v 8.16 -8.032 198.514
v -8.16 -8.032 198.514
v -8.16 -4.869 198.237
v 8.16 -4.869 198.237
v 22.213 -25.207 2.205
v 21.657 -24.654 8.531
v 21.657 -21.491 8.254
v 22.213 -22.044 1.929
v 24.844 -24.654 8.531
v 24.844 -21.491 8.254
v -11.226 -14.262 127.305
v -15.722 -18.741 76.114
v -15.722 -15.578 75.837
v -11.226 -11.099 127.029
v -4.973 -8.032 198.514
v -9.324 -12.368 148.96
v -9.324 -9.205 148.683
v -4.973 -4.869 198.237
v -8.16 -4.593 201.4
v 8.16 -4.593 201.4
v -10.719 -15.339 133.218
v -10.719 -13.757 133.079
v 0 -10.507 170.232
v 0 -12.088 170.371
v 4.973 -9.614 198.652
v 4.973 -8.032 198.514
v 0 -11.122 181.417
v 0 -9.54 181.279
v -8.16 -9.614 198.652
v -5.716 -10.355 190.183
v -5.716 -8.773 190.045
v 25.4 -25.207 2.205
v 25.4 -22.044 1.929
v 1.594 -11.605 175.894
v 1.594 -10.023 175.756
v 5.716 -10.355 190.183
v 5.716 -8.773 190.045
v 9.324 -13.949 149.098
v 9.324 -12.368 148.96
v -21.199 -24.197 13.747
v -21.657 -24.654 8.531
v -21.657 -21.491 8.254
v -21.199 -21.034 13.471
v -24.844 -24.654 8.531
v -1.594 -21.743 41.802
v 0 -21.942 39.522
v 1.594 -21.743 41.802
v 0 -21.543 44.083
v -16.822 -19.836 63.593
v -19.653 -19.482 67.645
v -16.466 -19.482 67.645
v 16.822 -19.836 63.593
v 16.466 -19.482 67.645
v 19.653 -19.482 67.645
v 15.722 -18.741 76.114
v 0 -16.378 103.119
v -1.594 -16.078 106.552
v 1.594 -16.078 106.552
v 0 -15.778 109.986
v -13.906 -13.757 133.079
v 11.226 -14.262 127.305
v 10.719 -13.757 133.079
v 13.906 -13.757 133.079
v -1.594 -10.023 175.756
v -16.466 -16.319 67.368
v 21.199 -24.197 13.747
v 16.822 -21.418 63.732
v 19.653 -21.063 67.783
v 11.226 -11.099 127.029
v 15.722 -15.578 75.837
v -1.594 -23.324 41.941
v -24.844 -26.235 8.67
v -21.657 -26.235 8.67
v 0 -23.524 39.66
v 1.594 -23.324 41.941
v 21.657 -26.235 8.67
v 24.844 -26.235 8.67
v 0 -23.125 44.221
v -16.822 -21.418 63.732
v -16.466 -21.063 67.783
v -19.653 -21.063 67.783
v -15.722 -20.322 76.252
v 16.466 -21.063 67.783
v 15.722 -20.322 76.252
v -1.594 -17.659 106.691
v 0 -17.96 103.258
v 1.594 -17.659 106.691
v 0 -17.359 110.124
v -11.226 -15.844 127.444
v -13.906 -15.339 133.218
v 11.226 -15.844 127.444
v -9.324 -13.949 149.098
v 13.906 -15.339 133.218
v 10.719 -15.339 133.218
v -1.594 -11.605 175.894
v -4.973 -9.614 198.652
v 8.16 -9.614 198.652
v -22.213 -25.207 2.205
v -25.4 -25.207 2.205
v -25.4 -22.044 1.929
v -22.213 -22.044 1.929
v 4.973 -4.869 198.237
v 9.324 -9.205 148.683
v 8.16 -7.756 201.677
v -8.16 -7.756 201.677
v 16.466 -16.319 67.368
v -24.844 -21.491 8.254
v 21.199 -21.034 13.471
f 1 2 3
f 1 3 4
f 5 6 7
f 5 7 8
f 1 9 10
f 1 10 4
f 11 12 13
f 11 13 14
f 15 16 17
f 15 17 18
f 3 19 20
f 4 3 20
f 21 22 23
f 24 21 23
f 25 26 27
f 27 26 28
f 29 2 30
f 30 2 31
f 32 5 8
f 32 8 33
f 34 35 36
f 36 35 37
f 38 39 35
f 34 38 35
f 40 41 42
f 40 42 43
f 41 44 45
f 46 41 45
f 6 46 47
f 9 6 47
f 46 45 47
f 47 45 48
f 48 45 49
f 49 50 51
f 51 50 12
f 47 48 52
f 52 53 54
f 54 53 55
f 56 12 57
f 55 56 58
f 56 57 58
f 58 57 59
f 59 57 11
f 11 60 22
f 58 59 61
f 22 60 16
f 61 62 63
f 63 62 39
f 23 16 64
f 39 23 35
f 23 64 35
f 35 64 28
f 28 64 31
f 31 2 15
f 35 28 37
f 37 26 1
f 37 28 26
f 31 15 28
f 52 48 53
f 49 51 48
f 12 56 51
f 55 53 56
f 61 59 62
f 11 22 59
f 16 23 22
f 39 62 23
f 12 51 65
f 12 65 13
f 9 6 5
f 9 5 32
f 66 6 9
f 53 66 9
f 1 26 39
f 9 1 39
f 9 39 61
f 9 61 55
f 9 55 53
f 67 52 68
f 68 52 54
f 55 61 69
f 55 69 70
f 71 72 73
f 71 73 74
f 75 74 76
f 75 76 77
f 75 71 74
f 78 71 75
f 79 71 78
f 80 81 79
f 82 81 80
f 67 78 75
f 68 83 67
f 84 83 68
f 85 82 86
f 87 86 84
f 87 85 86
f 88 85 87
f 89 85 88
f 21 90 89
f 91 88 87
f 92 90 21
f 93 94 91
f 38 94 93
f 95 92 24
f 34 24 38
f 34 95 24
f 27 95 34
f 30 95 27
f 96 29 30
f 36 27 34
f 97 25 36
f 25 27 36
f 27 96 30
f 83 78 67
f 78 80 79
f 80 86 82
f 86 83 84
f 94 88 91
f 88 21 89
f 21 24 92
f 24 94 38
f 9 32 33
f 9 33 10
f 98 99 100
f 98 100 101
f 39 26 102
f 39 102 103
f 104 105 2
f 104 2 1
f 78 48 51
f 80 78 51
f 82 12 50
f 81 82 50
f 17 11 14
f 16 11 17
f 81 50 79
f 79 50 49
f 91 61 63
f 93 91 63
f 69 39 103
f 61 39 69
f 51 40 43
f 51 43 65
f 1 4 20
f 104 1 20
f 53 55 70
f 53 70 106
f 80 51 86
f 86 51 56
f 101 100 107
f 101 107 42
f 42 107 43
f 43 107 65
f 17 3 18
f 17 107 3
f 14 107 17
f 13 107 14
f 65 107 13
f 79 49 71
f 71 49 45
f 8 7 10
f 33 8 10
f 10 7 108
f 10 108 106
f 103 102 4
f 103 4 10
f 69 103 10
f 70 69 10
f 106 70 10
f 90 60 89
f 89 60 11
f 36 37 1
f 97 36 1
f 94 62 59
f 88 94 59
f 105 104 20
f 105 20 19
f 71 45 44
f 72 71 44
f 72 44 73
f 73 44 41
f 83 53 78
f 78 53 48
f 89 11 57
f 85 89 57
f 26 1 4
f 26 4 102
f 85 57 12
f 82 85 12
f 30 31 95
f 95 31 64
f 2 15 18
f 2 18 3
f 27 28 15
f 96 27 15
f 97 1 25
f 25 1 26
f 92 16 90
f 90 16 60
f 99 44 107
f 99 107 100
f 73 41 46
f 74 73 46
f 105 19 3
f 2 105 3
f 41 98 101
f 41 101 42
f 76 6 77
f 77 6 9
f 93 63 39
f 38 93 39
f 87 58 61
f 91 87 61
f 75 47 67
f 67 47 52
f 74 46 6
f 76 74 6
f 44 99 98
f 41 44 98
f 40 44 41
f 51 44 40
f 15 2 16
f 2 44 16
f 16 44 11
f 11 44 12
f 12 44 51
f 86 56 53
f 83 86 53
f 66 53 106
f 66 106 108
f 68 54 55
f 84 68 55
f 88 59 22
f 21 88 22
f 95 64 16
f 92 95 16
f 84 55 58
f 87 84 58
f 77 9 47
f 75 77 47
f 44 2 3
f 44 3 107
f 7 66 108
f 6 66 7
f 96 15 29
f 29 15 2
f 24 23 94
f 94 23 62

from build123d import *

# Parameters (mm, degrees)
F5_DEPTH = 3.175
F6_DEPTH = 3.175
F7_DEPTH = 1.5875


with BuildPart() as f5:
    # F4 (on line) → F5 (new body)
    with BuildSketch(Plane(origin=(0, -25.2070583861, 2.2053322939), x_dir=(1, 0, 0), z_dir=(0, -0.9961946966, 0.0871557602))):
        Polygon((-8.1596356954, 200.2332657202), (-8.1596356954, 197.0582657202), (-4.9725077112, 197.0582657202), (4.9725077112, 197.0582657202), (8.1596356954, 197.0582657202), (8.1596356954, 200.2332657202), align=None)
    extrude(amount=-F5_DEPTH)


with BuildPart() as f6:
    # F4 (on line) → F6 (new body)
    with BuildSketch(Plane(origin=(0, -25.2070583861, 2.2053322939), x_dir=(1, 0, 0), z_dir=(0, -0.9961946966, 0.0871557602))):
        Polygon((-4.9725077112, 197.0582657202), (-8.1596356954, 197.0582657202), (-5.7162625489, 188.5571090249), align=None)
        Polygon((-5.7162625489, 188.5571090249), (-8.1596356954, 197.0582657202), (-13.9062760659, 131.3738657202), (-9.3244573772, 147.3152534193), align=None)
        Polygon((-9.3244573772, 147.3152534193), (-13.9062760659, 131.3738657202), (-10.7191480817, 131.3738657202), align=None)
        Polygon((-10.7191480817, 131.3738657202), (-13.9062760659, 131.3738657202), (-11.2262337703, 125.5778497774), align=None)
        Polygon((-11.2262337703, 125.5778497774), (-13.9062760659, 131.3738657202), (-19.6529164364, 65.6894657202), (-15.7220336145, 74.1906224154), align=None)
        Polygon((-15.7220336145, 74.1906224154), (-19.6529164364, 65.6894657202), (-16.4657884522, 65.6894657202), align=None)
        Polygon((-16.4657884522, 65.6894657202), (-19.6529164364, 65.6894657202), (-16.8216044507, 61.6224702472), align=None)
        Polygon((-16.8216044507, 61.6224702472), (-19.6529164364, 65.6894657202), (-24.8444469866, 6.35), (-21.1992164113, 11.5861365765), align=None)
        Polygon((-21.1992164113, 11.5861365765), (-24.8444469866, 6.35), (-21.6573190024, 6.35), align=None)
        Polygon((-21.6573190024, 6.35), (-24.8444469866, 6.35), (-25.4, 0), (-22.2370818336, 0), (-22.2128720158, 0), align=None)
    extrude(amount=-F6_DEPTH)


with BuildPart() as f6b:
    # F4 (on line) → F6, piece 2 (new body)
    with BuildSketch(Plane(origin=(0, -25.2070583861, 2.2053322939), x_dir=(1, 0, 0), z_dir=(0, -0.9961946966, 0.0871557602))):
        Polygon((8.1596356954, 197.0582657202), (4.9725077112, 197.0582657202), (5.7162625489, 188.5571090249), align=None)
        Polygon((8.1596356954, 197.0582657202), (5.7162625489, 188.5571090249), (9.3244573772, 147.3152534193), (13.9062760659, 131.3738657202), align=None)
        Polygon((9.3244573772, 147.3152534193), (10.7191480817, 131.3738657202), (13.9062760659, 131.3738657202), align=None)
        Polygon((13.9062760659, 131.3738657202), (10.7191480817, 131.3738657202), (11.2262337703, 125.5778497774), align=None)
        Polygon((19.6529164364, 65.6894657202), (13.9062760659, 131.3738657202), (11.2262337703, 125.5778497774), (15.7220336145, 74.1906224154), align=None)
        Polygon((15.7220336145, 74.1906224154), (16.4657884522, 65.6894657202), (19.6529164364, 65.6894657202), align=None)
        Polygon((19.6529164364, 65.6894657202), (16.4657884522, 65.6894657202), (16.8216044507, 61.6224702472), align=None)
        Polygon((24.8444469866, 6.35), (19.6529164364, 65.6894657202), (16.8216044507, 61.6224702472), (21.1992164113, 11.5861365765), align=None)
        Polygon((21.1992164113, 11.5861365765), (21.6573190024, 6.35), (24.8444469866, 6.35), align=None)
        Polygon((24.8444469866, 6.35), (21.6573190024, 6.35), (22.2128720158, 0), (25.4, 0), align=None)
    extrude(amount=-F6_DEPTH)


with BuildPart() as f7:
    # F4 (on line) → F7 (new body)
    with BuildSketch(Plane(origin=(0, -25.2070583861, 2.2053322939), x_dir=(1, 0, 0), z_dir=(0, -0.9961946966, 0.0871557602))):
        Polygon((-4.9725077112, 197.0582657202), (-8.1596356954, 197.0582657202), (-5.7162625489, 188.5571090249), align=None)
        Polygon((0, 179.7575651368), (-4.9725077112, 197.0582657202), (-5.7162625489, 188.5571090249), (-1.5935639921, 174.213124567), align=None)
        Polygon((5.7162625489, 188.5571090249), (4.9725077112, 197.0582657202), (0, 179.7575651368), (1.5935639921, 174.213124567), align=None)
        Polygon((8.1596356954, 197.0582657202), (4.9725077112, 197.0582657202), (5.7162625489, 188.5571090249), align=None)
        Polygon((1.5935639921, 174.213124567), (0, 179.7575651368), (-1.5935639921, 174.213124567), (0, 168.6686839972), align=None)
        Polygon((-9.3244573772, 147.3152534193), (-10.7191480817, 131.3738657202), (0, 168.6686839972), (-1.5935639921, 174.213124567), align=None)
        Polygon((-9.3244573772, 147.3152534193), (-13.9062760659, 131.3738657202), (-10.7191480817, 131.3738657202), align=None)
        Polygon((1.5935639921, 174.213124567), (0, 168.6686839972), (10.7191480817, 131.3738657202), (9.3244573772, 147.3152534193), align=None)
        Polygon((9.3244573772, 147.3152534193), (10.7191480817, 131.3738657202), (13.9062760659, 131.3738657202), align=None)
        Polygon((10.7191480817, 131.3738657202), (0, 108.1920102412), (1.5935639921, 104.7456757116), (11.2262337703, 125.5778497774), align=None)
        Polygon((13.9062760659, 131.3738657202), (10.7191480817, 131.3738657202), (11.2262337703, 125.5778497774), align=None)
        Polygon((-10.7191480817, 131.3738657202), (-11.2262337703, 125.5778497774), (-1.5935639921, 104.7456757116), (0, 108.1920102412), align=None)
        Polygon((-10.7191480817, 131.3738657202), (-13.9062760659, 131.3738657202), (-11.2262337703, 125.5778497774), align=None)
        Polygon((0, 108.1920102412), (-1.5935639921, 104.7456757116), (0, 101.299341182), (1.5935639921, 104.7456757116), align=None)
        Polygon((-15.7220336145, 74.1906224154), (-16.4657884522, 65.6894657202), (0, 101.299341182), (-1.5935639921, 104.7456757116), align=None)
        Polygon((1.5935639921, 104.7456757116), (0, 101.299341182), (16.4657884522, 65.6894657202), (15.7220336145, 74.1906224154), align=None)
        Polygon((15.7220336145, 74.1906224154), (16.4657884522, 65.6894657202), (19.6529164364, 65.6894657202), align=None)
        Polygon((19.6529164364, 65.6894657202), (16.4657884522, 65.6894657202), (16.8216044507, 61.6224702472), align=None)
        Polygon((16.4657884522, 65.6894657202), (0, 42.0374318105), (1.5935639921, 39.7483808071), (16.8216044507, 61.6224702472), align=None)
        Polygon((-15.7220336145, 74.1906224154), (-19.6529164364, 65.6894657202), (-16.4657884522, 65.6894657202), align=None)
        Polygon((-16.4657884522, 65.6894657202), (-19.6529164364, 65.6894657202), (-16.8216044507, 61.6224702472), align=None)
        Polygon((-16.4657884522, 65.6894657202), (-16.8216044507, 61.6224702472), (-1.5935639921, 39.7483808071), (0, 42.0374318105), align=None)
        Polygon((0, 42.0374318105), (-1.5935639921, 39.7483808071), (0, 37.4593298037), (1.5935639921, 39.7483808071), align=None)
        Polygon((-1.5935639921, 39.7483808071), (-21.1992164113, 11.5861365765), (-21.6573190024, 6.35), (0, 37.4593298037), align=None)
        Polygon((1.5935639921, 39.7483808071), (0, 37.4593298037), (21.6573190024, 6.35), (21.1992164113, 11.5861365765), align=None)
        Polygon((-21.1992164113, 11.5861365765), (-24.8444469866, 6.35), (-21.6573190024, 6.35), align=None)
        Polygon((21.1992164113, 11.5861365765), (21.6573190024, 6.35), (24.8444469866, 6.35), align=None)
    extrude(amount=F7_DEPTH)


solid = Compound([f5.part, f6.part, f6b.part, f7.part])
